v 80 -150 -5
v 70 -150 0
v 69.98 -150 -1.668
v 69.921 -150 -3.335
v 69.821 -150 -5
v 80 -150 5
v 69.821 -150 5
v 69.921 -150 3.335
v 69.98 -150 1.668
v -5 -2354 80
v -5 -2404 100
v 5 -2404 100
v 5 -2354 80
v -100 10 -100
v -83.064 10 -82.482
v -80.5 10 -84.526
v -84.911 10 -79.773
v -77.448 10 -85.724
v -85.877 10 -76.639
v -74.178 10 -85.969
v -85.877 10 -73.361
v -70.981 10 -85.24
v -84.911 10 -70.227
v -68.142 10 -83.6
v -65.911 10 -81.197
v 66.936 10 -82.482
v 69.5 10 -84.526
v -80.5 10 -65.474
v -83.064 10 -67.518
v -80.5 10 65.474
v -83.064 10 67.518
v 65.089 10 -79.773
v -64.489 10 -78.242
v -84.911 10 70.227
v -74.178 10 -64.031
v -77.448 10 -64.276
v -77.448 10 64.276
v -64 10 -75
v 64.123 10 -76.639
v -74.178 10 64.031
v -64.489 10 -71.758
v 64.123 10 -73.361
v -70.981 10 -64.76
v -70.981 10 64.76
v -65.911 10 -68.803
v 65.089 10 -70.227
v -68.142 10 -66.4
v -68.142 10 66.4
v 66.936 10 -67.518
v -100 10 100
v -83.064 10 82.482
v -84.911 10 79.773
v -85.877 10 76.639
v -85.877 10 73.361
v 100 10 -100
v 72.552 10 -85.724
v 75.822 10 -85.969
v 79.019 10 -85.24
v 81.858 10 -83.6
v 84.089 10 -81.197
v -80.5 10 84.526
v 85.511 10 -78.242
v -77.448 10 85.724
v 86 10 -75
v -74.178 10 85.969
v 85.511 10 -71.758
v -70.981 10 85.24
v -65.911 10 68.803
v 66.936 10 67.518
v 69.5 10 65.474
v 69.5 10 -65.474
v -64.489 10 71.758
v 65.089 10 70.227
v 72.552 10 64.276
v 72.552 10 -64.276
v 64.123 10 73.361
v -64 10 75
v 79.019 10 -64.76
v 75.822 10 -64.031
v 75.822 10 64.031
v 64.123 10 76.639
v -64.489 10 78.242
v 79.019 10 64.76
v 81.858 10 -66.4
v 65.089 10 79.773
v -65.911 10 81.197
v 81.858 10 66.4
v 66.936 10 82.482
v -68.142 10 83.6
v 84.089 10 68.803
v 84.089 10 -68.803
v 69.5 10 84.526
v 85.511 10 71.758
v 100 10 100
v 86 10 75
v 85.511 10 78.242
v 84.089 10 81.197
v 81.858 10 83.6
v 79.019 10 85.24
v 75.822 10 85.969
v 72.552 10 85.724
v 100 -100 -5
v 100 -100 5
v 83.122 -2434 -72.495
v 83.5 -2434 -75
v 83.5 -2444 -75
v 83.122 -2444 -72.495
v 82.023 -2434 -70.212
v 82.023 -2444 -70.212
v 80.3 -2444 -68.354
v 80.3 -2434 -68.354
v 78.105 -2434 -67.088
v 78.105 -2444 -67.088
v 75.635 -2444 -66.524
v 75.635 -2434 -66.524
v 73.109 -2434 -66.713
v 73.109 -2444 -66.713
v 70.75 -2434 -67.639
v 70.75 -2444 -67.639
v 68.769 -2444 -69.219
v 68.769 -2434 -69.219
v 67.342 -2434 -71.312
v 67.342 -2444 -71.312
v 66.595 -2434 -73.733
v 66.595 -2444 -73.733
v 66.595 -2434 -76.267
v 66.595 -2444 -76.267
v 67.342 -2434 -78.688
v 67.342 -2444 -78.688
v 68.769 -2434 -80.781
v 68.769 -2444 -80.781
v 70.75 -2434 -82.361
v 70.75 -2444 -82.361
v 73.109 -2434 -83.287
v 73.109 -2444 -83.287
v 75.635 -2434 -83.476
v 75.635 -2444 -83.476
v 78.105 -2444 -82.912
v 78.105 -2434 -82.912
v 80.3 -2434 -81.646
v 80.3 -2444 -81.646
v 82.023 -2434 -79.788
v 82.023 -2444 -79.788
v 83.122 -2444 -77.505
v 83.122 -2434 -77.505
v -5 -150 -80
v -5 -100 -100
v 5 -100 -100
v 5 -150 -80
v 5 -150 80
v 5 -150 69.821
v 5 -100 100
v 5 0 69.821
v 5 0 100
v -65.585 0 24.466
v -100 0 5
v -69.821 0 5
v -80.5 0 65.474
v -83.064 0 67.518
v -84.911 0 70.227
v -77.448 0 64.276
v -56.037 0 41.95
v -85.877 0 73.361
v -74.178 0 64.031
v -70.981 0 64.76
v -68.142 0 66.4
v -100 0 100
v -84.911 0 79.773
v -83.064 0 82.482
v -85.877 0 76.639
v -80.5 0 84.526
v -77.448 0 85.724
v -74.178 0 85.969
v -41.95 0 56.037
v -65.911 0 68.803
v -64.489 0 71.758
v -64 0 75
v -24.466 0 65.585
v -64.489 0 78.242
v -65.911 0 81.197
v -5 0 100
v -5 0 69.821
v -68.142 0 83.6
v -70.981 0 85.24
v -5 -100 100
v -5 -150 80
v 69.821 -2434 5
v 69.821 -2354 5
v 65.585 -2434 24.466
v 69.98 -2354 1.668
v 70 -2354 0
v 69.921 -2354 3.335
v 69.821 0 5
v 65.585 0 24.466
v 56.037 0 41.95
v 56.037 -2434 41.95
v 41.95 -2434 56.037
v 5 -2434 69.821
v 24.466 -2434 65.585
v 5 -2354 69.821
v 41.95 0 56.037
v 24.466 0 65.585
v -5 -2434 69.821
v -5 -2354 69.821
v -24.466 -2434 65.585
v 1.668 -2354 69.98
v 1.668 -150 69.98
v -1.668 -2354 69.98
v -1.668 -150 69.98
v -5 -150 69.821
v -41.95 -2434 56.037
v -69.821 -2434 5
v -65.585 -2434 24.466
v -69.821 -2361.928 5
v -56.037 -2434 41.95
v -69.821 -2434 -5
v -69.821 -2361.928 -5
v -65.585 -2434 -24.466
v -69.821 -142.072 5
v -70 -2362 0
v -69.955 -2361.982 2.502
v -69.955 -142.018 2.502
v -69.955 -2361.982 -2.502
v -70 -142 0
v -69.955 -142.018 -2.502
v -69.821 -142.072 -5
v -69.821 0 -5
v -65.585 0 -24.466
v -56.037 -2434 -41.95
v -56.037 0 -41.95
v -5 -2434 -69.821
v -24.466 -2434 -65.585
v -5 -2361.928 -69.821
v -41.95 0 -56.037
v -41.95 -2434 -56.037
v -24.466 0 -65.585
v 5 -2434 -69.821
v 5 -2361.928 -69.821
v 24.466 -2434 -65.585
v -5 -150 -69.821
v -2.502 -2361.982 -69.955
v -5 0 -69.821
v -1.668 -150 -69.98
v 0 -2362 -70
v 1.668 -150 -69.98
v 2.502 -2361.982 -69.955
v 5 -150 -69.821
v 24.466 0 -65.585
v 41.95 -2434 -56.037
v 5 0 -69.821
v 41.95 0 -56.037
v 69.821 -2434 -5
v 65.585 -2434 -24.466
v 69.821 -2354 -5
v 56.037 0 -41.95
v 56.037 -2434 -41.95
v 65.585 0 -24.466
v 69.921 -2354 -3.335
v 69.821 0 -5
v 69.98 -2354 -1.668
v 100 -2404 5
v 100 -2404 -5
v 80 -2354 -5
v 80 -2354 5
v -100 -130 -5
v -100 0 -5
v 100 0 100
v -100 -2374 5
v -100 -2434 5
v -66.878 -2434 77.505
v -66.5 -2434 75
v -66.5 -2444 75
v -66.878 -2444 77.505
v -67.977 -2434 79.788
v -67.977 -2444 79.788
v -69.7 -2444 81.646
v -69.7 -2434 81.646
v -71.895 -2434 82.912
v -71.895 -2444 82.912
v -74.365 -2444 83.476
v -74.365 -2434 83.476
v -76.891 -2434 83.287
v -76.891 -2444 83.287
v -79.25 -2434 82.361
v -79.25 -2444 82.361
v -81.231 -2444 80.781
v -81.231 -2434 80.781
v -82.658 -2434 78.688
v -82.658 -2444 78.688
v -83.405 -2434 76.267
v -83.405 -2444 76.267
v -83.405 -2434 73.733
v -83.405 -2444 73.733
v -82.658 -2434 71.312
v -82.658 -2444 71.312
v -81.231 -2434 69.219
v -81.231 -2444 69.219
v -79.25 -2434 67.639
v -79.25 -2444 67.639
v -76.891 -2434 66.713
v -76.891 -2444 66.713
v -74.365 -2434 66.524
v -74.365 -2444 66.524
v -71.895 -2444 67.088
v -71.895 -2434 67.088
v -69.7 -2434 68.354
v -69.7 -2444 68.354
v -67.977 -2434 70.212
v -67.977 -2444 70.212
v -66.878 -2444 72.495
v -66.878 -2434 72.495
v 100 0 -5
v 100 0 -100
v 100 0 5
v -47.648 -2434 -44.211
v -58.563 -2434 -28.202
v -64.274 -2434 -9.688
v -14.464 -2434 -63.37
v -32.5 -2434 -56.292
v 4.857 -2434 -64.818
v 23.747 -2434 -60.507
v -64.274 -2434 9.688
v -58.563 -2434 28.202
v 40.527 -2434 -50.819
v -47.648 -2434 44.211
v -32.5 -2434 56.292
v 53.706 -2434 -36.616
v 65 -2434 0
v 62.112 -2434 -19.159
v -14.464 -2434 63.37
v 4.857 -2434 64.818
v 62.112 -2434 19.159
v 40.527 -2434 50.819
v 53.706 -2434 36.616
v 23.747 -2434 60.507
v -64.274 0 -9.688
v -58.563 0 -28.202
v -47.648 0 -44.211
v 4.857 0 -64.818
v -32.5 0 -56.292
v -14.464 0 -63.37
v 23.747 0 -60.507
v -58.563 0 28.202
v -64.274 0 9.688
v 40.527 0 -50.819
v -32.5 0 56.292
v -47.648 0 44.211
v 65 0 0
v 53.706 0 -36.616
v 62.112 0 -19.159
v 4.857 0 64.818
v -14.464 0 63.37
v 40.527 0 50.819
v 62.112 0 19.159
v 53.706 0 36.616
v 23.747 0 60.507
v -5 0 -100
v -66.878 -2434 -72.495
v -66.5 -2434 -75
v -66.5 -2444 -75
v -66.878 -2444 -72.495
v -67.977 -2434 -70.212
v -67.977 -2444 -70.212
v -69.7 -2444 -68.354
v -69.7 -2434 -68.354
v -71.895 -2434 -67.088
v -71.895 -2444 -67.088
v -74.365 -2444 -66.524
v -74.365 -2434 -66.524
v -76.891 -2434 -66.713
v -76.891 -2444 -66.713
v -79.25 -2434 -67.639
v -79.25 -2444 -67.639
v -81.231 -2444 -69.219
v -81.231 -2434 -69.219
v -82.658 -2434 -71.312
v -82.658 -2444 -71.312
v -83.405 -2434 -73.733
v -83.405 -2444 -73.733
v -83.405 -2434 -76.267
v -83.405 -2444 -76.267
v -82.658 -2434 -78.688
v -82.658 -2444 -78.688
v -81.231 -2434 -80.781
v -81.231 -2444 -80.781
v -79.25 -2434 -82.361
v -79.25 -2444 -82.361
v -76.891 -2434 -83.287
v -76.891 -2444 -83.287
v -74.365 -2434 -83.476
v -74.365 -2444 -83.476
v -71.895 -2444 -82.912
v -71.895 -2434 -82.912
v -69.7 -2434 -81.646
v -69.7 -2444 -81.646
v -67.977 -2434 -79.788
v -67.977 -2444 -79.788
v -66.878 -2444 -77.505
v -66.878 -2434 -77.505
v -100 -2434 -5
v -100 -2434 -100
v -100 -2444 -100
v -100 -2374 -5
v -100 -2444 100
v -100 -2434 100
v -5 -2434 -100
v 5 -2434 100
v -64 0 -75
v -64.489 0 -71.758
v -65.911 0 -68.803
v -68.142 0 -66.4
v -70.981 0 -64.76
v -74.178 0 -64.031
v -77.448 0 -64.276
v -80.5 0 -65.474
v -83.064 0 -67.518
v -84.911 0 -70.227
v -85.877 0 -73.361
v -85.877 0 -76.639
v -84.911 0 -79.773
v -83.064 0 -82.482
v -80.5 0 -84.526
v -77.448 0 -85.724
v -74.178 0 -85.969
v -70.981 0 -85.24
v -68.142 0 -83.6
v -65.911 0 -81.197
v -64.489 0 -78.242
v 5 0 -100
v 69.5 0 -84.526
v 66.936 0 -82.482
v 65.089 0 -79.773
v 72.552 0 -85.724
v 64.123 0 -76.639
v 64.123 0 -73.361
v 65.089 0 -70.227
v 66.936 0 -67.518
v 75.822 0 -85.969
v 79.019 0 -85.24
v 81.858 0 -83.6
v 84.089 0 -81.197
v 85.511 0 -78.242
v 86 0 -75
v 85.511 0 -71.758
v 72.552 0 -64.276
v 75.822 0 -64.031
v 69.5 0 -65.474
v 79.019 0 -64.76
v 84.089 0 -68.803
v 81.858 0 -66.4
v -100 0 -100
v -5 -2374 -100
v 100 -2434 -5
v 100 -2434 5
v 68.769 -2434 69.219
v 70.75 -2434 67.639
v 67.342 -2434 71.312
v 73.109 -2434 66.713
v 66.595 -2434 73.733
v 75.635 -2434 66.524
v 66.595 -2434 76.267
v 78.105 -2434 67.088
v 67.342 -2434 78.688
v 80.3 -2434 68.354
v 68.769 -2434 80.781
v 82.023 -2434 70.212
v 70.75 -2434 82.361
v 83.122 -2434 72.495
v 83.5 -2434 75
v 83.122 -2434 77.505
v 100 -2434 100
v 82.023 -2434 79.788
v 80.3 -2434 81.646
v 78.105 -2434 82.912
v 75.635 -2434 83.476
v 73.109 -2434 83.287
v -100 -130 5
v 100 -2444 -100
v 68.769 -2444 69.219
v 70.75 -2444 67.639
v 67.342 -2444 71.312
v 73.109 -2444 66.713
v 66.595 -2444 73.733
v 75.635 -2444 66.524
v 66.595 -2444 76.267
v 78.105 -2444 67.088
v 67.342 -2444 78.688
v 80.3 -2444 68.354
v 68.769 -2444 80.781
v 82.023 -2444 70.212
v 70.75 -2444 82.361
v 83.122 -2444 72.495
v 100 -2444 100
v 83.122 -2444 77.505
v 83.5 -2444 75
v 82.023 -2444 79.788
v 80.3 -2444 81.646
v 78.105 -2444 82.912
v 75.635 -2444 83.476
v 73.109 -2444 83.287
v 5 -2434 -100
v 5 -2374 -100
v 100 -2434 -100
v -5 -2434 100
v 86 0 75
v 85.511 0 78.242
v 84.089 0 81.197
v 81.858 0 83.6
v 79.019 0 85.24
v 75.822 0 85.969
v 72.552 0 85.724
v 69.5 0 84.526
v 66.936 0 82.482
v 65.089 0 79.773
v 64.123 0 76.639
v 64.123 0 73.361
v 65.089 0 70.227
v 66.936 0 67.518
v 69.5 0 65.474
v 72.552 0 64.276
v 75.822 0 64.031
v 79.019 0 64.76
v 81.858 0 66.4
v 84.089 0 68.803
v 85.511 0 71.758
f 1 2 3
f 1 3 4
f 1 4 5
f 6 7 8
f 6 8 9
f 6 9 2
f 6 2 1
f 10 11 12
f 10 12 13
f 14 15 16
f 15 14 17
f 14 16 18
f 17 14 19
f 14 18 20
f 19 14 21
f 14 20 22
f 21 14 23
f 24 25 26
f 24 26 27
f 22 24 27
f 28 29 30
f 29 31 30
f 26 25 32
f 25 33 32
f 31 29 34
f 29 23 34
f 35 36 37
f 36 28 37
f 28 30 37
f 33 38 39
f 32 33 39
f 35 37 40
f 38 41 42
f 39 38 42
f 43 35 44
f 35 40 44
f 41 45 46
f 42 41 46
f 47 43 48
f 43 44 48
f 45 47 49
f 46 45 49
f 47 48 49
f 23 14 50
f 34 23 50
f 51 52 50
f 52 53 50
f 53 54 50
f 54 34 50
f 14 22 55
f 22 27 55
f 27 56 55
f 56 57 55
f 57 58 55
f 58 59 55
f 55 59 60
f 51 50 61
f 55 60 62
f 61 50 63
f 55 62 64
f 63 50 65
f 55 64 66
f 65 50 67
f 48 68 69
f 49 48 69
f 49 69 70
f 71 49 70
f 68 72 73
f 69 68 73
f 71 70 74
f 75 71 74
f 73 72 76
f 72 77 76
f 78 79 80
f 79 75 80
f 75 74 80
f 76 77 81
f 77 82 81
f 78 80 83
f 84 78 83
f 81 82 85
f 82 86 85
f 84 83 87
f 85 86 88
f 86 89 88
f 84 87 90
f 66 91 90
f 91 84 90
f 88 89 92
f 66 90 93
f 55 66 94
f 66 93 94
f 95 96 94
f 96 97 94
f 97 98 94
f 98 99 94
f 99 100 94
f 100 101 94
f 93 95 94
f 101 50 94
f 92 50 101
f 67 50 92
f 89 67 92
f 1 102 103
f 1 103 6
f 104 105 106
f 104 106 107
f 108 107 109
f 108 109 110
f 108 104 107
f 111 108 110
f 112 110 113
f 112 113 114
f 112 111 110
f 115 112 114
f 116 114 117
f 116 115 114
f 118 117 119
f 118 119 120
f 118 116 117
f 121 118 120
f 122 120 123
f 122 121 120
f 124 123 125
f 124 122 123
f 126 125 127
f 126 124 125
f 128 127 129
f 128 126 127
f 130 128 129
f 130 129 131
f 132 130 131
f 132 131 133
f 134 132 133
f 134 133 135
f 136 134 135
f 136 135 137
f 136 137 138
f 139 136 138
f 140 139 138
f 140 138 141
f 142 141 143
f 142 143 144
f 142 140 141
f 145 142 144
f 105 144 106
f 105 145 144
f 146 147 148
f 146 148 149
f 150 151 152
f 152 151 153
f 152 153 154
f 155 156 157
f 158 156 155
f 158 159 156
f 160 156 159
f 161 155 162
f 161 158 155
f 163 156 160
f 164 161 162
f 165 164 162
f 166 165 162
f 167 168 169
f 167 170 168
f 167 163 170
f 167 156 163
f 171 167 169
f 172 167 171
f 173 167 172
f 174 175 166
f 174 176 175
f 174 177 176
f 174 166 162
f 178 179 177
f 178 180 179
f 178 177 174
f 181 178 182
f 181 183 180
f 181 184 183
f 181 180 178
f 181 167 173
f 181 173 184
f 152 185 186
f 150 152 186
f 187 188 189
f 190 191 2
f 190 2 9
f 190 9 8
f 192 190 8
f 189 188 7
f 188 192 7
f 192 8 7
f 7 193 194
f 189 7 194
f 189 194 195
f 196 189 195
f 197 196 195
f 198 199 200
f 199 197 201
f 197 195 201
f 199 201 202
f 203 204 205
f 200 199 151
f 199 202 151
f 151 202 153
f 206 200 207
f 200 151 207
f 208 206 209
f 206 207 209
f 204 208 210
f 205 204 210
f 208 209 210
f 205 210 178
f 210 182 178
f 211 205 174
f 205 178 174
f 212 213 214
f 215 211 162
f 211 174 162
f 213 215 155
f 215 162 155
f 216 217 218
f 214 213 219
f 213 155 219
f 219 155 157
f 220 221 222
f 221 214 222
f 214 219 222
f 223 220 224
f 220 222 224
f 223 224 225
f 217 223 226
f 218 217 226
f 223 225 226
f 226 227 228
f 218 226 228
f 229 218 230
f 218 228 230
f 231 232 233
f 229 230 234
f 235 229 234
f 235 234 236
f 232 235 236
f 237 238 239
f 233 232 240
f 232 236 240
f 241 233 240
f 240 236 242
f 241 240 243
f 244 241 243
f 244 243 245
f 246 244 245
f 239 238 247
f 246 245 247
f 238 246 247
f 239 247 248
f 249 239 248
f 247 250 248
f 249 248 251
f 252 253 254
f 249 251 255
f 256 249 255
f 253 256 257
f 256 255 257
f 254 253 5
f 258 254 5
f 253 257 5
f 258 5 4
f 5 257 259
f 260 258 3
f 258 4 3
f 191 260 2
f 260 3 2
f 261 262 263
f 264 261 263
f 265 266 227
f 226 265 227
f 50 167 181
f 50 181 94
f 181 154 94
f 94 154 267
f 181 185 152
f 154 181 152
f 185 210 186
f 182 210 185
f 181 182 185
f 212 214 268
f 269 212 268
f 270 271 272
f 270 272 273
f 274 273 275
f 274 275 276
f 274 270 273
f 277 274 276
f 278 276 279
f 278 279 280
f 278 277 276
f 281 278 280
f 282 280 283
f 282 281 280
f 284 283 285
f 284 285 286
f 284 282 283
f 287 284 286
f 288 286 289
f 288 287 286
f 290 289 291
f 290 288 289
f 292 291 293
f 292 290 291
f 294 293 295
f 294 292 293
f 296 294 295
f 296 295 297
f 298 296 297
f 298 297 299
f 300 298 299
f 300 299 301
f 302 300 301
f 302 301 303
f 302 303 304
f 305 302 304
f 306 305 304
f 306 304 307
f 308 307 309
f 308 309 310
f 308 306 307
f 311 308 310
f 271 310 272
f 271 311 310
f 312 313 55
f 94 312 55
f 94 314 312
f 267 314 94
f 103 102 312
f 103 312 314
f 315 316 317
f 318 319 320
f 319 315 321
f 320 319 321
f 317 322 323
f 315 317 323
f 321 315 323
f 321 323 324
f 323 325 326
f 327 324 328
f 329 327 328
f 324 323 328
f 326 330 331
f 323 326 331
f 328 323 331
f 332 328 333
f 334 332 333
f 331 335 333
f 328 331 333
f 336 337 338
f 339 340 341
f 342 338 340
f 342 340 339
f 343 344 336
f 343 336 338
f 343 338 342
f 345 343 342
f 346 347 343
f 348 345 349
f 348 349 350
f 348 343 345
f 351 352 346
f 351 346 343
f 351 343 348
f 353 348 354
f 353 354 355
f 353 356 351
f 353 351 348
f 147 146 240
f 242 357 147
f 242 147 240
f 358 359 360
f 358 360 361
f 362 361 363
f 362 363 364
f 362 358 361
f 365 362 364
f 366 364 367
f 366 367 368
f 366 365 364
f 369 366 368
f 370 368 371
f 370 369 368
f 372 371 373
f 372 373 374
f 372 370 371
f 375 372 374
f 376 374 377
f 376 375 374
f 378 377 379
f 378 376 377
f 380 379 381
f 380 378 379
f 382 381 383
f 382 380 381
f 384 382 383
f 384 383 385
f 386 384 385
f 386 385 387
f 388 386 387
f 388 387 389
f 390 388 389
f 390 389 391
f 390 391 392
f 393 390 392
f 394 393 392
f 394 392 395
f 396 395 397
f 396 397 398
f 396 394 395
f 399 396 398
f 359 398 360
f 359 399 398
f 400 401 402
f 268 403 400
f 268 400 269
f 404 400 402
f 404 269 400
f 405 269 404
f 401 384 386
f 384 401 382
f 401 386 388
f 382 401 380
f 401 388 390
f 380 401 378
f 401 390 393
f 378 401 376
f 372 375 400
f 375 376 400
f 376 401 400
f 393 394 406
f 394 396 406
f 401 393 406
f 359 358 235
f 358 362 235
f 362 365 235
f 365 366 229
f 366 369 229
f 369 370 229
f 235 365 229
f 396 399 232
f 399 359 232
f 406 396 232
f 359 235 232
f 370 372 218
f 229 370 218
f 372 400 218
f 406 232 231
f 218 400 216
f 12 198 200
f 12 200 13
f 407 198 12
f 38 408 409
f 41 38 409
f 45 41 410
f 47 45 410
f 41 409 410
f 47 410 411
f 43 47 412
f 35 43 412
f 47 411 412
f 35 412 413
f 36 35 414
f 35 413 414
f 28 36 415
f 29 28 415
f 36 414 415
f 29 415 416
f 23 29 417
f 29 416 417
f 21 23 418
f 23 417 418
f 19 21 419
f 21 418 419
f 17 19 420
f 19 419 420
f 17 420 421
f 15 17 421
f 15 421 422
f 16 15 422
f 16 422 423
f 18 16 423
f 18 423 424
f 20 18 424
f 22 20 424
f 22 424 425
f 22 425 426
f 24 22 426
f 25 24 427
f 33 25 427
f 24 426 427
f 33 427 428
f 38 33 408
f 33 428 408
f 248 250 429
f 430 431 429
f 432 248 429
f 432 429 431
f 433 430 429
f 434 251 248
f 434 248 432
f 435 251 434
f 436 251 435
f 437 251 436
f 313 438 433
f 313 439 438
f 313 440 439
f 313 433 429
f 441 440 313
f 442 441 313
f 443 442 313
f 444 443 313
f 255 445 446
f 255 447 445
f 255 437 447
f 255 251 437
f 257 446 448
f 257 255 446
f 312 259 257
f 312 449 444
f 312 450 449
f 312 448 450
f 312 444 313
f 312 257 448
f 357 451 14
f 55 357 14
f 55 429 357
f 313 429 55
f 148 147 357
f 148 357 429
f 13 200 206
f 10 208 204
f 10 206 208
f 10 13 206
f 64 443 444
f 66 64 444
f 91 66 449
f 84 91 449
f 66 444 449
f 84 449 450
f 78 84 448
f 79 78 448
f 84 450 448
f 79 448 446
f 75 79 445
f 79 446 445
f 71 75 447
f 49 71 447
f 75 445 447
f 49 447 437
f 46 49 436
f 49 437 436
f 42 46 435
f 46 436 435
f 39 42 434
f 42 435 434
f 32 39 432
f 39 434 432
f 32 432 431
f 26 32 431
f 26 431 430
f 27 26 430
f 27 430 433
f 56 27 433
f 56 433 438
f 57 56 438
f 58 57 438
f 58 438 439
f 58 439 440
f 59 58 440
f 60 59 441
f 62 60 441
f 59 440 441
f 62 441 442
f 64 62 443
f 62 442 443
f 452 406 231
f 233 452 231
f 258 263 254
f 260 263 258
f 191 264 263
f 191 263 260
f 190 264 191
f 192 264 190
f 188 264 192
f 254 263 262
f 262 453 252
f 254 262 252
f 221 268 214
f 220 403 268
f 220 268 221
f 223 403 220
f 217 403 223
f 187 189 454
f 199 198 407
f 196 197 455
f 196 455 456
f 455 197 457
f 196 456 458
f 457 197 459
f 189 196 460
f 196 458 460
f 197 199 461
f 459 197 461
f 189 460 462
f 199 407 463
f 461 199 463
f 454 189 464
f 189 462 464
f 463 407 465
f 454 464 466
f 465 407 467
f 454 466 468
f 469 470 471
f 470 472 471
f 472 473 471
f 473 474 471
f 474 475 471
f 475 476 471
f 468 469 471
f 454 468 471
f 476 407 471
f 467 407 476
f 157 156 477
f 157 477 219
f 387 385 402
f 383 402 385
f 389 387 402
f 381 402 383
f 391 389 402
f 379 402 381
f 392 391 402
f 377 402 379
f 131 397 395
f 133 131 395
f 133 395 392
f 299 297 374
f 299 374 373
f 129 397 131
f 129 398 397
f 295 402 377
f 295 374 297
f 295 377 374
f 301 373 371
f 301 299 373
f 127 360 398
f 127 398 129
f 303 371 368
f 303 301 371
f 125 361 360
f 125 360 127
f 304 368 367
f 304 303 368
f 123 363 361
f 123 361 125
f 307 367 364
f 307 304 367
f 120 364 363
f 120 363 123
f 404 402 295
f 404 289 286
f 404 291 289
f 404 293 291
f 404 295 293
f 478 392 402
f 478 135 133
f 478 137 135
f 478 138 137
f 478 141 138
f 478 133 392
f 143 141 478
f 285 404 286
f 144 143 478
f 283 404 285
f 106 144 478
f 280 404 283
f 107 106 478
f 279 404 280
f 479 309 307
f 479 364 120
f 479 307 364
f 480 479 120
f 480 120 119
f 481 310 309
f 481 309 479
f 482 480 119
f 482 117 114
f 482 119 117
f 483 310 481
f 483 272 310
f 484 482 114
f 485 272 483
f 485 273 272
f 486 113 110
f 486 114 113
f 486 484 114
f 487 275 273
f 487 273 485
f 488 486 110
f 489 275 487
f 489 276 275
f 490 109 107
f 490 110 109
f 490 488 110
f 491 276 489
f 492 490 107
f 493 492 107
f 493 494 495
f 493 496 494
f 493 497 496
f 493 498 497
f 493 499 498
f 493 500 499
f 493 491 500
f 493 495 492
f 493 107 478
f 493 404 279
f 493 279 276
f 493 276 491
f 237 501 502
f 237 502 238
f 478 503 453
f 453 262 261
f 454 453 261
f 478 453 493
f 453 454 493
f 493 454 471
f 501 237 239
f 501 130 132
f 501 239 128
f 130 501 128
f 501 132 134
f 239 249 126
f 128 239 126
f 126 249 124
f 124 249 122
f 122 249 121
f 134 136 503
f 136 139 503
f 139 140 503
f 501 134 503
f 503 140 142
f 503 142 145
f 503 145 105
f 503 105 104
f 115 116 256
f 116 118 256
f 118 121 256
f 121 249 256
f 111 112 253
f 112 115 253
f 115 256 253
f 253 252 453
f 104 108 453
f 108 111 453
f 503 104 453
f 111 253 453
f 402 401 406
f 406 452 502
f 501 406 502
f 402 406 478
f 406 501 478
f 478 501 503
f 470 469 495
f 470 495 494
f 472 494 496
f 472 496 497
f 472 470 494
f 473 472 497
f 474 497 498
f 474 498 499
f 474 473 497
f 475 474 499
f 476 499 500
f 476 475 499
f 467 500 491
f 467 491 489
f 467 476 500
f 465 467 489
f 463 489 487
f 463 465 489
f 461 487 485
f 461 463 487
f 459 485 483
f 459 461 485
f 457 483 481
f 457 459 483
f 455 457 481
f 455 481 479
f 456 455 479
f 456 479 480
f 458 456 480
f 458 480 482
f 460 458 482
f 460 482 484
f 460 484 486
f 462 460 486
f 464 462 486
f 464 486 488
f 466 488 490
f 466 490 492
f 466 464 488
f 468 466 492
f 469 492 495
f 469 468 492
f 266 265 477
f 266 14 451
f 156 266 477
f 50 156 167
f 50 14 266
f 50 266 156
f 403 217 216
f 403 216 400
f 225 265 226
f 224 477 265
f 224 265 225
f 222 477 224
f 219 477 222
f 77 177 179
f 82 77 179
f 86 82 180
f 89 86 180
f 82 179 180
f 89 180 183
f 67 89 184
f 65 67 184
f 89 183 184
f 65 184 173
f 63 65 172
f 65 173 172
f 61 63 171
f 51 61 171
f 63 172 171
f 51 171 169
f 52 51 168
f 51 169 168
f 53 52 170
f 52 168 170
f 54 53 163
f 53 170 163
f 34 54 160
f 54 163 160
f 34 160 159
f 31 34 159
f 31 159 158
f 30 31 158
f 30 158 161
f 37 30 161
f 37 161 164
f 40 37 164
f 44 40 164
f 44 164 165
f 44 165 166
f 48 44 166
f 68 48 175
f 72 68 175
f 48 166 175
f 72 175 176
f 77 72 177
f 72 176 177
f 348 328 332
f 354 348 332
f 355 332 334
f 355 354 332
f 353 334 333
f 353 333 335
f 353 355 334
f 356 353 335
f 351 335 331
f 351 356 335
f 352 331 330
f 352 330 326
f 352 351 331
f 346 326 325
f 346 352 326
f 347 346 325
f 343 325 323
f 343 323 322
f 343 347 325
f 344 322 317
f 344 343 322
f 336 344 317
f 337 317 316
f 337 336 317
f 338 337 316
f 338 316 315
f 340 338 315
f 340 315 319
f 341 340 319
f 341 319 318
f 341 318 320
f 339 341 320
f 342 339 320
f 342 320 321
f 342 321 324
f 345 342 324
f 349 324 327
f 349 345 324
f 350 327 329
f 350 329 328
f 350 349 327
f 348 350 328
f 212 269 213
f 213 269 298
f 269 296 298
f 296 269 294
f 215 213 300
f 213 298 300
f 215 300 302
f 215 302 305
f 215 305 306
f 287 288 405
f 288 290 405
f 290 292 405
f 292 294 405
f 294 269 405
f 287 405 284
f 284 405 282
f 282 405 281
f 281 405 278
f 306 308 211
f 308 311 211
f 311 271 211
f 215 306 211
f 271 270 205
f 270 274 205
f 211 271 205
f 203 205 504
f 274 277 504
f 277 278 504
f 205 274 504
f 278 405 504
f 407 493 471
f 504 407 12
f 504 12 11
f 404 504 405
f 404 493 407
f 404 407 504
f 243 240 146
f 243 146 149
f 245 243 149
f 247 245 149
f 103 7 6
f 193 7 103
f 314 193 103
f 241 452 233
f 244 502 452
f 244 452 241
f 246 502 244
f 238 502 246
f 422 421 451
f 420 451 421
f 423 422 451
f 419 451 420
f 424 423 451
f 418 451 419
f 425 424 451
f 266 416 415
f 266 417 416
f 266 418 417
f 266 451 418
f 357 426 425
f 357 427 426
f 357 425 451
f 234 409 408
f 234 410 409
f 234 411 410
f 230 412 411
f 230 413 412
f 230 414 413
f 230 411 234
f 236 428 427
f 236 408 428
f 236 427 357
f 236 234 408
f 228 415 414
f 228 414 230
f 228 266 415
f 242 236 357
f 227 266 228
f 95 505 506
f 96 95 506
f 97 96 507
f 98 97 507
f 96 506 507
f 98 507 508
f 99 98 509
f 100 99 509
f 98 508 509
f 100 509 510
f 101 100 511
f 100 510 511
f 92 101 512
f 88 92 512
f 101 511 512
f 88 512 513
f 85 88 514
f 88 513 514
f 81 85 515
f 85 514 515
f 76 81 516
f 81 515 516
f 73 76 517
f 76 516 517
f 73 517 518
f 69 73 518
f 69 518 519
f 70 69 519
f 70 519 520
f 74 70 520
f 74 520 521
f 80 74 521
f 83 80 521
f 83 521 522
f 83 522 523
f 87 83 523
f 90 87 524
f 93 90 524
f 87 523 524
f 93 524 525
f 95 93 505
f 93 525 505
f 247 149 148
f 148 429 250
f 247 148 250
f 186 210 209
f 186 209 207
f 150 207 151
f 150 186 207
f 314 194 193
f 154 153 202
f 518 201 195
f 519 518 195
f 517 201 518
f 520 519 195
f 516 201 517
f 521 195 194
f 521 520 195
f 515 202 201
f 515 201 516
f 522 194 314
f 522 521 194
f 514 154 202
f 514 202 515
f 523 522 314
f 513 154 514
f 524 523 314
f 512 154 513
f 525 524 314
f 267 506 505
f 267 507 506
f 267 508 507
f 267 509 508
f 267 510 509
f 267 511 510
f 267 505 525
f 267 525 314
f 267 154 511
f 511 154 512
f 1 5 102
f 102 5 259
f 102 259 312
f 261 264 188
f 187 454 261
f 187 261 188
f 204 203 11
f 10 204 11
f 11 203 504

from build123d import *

# Parameters (mm, degrees)
F0_R          = 70
F0_R_2        = 65
F1_DEPTH      = 2434
F2_W          = 200
F2_H          = 200
F2_R          = 11
F3_DEPTH      = 10
F4_W          = 30.1787997812
F4_H          = 10
F4_W_2        = 10
F4_H_2        = 30.1787997812
F5_DEPTH      = 150
F6_T1_DEPTH   = 269.311363913
F6_T3_DEPTH   = 269.311363913
F6_T8_DEPTH   = 269.311363913
F6_S9_R       = 70
F6_T10_DEPTH  = 139
F8_W          = 200
F8_H          = 200
F8_R          = 8.5
F9_DEPTH      = 10
F10_W         = 10
F10_H         = 30.1787997812
F10_W_2       = 30.1787997812
F10_H_2       = 10
F11_DEPTH     = 80
F12_T1_DEPTH  = 269.311363913
F12_T3_DEPTH  = 269.311363913
F12_T8_DEPTH  = 269.311363913
F12_S9_R      = 70
F12_T10_DEPTH = 139
F12_T14_DEPTH = 269.311363913
F12_S15_R     = 70
F12_T16_DEPTH = 139


# Not quite as in the source:
# - a fillet or chamfer that OpenCascade refuses, or shapes differently, is made with other operations: its cross-section is extruded or revolved along the edge and cut away or added


with BuildPart() as f1:
    # F0 (on Front) → F1 (new body)
    with BuildSketch(Plane.XZ):
        Circle(F0_R)
        Circle(F0_R_2, mode=Mode.SUBTRACT)
    extrude(amount=F1_DEPTH)

    # F2 (on Front) → F3 (join)
    with BuildSketch(Plane.XZ):
        Rectangle(F2_W, F2_H)
        with Locations((-75, -75)):
            Circle(F2_R, mode=Mode.SUBTRACT)
        with Locations((75, -75)):
            Circle(F2_R, mode=Mode.SUBTRACT)
        with Locations((-75, 75)):
            Circle(F2_R, mode=Mode.SUBTRACT)
        with Locations((75, 75)):
            Circle(F2_R, mode=Mode.SUBTRACT)
    extrude(amount=-F3_DEPTH)

    # F4 (on Front) → F5 (join)
    with BuildSketch(Plane.XZ):
        with Locations((-84.9106001094, 0)):
            Rectangle(F4_W, F4_H)
        with Locations((0, 84.9106001094)):
            Rectangle(F4_W_2, F4_H_2)
        with Locations((84.9106001094, 0)):
            Rectangle(F4_W, F4_H)
        with Locations((0, -84.9106001094)):
            Rectangle(F4_W_2, F4_H_2)
    extrude(amount=F5_DEPTH)

    # F6: chamfer of 50 x 20 on 4 edges, made by hand

    # F6_s2 → F6_t1 (cut)
    with BuildSketch(Plane.YZ.offset(-134.6556819565)):
        Polygon((-100, 100), (-150, 80), (-150, 100), align=None)
        Polygon((-100, -100), (-150, -80), (-150, -100), align=None)
    extrude(amount=F6_T1_DEPTH, mode=Mode.SUBTRACT)

    # F6_s4 → F6_t3 (cut)
    with BuildSketch(Plane.XY.offset(-134.6556819565)):
        Polygon((100, -100), (80, -150), (100, -150), align=None)
    extrude(amount=F6_T3_DEPTH, mode=Mode.SUBTRACT)


with BuildPart() as f6_tool6:
    # F6_s7 → F6_t8 (new body)
    with BuildSketch(Plane.XY.offset(134.6556819565)):
        Polygon((-100, -130), (-50, -150), (-100, -150), align=None)
    extrude(amount=-F6_T8_DEPTH)

    # F6_s9 → F6_t10 (cut, symmetric)
    with BuildSketch(Plane.XZ.offset(140)):
        Circle(F6_S9_R)
    extrude(amount=F6_T10_DEPTH, both=True, mode=Mode.SUBTRACT)


with BuildPart() as f1_1:
    add(f1.part)

    # F6_t5: cut F6_tool6
    add(f6_tool6.part, mode=Mode.SUBTRACT)

    # F8 (on offset) → F9 (join)
    with BuildSketch(Plane.XZ.offset(2434)):
        Rectangle(F8_W, F8_H)
        with Locations((-75, -75)):
            Circle(F8_R, mode=Mode.SUBTRACT)
        with Locations((75, -75)):
            Circle(F8_R, mode=Mode.SUBTRACT)
        with Locations((-75, 75)):
            Circle(F8_R, mode=Mode.SUBTRACT)
        with Locations((75, 75)):
            Circle(F8_R, mode=Mode.SUBTRACT)
    extrude(amount=F9_DEPTH)

    # F10 (on face) → F11 (join)
    with BuildSketch(Plane(origin=(0, -2434, 0), x_dir=(-1, 0, 0), z_dir=(0, 1, 0))):
        with Locations((0, 84.9106001094)):
            Rectangle(F10_W, F10_H)
        with Locations((84.9106001094, 0)):
            Rectangle(F10_W_2, F10_H_2)
        with Locations((0, -84.9106001094)):
            Rectangle(F10_W, F10_H)
        with Locations((-84.9106001094, 0)):
            Rectangle(F10_W_2, F10_H_2)
    extrude(amount=F11_DEPTH)

    # F12: chamfer of 20 x 50 on 4 edges, made by hand

    # F12_s2 → F12_t1 (cut)
    with BuildSketch(Plane.YZ.offset(-134.6556819565)):
        Polygon((-2404, 100), (-2354, 80), (-2354, 100), align=None)
    extrude(amount=F12_T1_DEPTH, mode=Mode.SUBTRACT)

    # F12_s4 → F12_t3 (cut)
    with BuildSketch(Plane.XY.offset(-134.6556819565)):
        Polygon((100, -2404), (80, -2354), (100, -2354), align=None)
    extrude(amount=F12_T3_DEPTH, mode=Mode.SUBTRACT)


with BuildPart() as f12_tool6:
    # F12_s7 → F12_t8 (new body)
    with BuildSketch(Plane.XY.offset(-134.6556819565)):
        Polygon((-100, -2374), (-50, -2354), (-100, -2354), align=None)
    extrude(amount=F12_T8_DEPTH)

    # F12_s9 → F12_t10 (cut, symmetric)
    with BuildSketch(Plane.XZ.offset(2364)):
        Circle(F12_S9_R)
    extrude(amount=F12_T10_DEPTH, both=True, mode=Mode.SUBTRACT)


with BuildPart() as f1_2:
    add(f1_1.part)

    # F12_t5: cut F12_tool6
    add(f12_tool6.part, mode=Mode.SUBTRACT)


with BuildPart() as f12_tool12:
    # F12_s13 → F12_t14 (new body)
    with BuildSketch(Plane.YZ.offset(134.6556819565)):
        Polygon((-2374, -100), (-2354, -50), (-2354, -100), align=None)
    extrude(amount=-F12_T14_DEPTH)

    # F12_s15 → F12_t16 (cut, symmetric)
    with BuildSketch(Plane.XZ.offset(2364)):
        Circle(F12_S15_R)
    extrude(amount=F12_T16_DEPTH, both=True, mode=Mode.SUBTRACT)


with BuildPart() as f1_3:
    add(f1_2.part)

    # F12_t11: cut F12_tool12
    add(f12_tool12.part, mode=Mode.SUBTRACT)


solid = f1_3.part
